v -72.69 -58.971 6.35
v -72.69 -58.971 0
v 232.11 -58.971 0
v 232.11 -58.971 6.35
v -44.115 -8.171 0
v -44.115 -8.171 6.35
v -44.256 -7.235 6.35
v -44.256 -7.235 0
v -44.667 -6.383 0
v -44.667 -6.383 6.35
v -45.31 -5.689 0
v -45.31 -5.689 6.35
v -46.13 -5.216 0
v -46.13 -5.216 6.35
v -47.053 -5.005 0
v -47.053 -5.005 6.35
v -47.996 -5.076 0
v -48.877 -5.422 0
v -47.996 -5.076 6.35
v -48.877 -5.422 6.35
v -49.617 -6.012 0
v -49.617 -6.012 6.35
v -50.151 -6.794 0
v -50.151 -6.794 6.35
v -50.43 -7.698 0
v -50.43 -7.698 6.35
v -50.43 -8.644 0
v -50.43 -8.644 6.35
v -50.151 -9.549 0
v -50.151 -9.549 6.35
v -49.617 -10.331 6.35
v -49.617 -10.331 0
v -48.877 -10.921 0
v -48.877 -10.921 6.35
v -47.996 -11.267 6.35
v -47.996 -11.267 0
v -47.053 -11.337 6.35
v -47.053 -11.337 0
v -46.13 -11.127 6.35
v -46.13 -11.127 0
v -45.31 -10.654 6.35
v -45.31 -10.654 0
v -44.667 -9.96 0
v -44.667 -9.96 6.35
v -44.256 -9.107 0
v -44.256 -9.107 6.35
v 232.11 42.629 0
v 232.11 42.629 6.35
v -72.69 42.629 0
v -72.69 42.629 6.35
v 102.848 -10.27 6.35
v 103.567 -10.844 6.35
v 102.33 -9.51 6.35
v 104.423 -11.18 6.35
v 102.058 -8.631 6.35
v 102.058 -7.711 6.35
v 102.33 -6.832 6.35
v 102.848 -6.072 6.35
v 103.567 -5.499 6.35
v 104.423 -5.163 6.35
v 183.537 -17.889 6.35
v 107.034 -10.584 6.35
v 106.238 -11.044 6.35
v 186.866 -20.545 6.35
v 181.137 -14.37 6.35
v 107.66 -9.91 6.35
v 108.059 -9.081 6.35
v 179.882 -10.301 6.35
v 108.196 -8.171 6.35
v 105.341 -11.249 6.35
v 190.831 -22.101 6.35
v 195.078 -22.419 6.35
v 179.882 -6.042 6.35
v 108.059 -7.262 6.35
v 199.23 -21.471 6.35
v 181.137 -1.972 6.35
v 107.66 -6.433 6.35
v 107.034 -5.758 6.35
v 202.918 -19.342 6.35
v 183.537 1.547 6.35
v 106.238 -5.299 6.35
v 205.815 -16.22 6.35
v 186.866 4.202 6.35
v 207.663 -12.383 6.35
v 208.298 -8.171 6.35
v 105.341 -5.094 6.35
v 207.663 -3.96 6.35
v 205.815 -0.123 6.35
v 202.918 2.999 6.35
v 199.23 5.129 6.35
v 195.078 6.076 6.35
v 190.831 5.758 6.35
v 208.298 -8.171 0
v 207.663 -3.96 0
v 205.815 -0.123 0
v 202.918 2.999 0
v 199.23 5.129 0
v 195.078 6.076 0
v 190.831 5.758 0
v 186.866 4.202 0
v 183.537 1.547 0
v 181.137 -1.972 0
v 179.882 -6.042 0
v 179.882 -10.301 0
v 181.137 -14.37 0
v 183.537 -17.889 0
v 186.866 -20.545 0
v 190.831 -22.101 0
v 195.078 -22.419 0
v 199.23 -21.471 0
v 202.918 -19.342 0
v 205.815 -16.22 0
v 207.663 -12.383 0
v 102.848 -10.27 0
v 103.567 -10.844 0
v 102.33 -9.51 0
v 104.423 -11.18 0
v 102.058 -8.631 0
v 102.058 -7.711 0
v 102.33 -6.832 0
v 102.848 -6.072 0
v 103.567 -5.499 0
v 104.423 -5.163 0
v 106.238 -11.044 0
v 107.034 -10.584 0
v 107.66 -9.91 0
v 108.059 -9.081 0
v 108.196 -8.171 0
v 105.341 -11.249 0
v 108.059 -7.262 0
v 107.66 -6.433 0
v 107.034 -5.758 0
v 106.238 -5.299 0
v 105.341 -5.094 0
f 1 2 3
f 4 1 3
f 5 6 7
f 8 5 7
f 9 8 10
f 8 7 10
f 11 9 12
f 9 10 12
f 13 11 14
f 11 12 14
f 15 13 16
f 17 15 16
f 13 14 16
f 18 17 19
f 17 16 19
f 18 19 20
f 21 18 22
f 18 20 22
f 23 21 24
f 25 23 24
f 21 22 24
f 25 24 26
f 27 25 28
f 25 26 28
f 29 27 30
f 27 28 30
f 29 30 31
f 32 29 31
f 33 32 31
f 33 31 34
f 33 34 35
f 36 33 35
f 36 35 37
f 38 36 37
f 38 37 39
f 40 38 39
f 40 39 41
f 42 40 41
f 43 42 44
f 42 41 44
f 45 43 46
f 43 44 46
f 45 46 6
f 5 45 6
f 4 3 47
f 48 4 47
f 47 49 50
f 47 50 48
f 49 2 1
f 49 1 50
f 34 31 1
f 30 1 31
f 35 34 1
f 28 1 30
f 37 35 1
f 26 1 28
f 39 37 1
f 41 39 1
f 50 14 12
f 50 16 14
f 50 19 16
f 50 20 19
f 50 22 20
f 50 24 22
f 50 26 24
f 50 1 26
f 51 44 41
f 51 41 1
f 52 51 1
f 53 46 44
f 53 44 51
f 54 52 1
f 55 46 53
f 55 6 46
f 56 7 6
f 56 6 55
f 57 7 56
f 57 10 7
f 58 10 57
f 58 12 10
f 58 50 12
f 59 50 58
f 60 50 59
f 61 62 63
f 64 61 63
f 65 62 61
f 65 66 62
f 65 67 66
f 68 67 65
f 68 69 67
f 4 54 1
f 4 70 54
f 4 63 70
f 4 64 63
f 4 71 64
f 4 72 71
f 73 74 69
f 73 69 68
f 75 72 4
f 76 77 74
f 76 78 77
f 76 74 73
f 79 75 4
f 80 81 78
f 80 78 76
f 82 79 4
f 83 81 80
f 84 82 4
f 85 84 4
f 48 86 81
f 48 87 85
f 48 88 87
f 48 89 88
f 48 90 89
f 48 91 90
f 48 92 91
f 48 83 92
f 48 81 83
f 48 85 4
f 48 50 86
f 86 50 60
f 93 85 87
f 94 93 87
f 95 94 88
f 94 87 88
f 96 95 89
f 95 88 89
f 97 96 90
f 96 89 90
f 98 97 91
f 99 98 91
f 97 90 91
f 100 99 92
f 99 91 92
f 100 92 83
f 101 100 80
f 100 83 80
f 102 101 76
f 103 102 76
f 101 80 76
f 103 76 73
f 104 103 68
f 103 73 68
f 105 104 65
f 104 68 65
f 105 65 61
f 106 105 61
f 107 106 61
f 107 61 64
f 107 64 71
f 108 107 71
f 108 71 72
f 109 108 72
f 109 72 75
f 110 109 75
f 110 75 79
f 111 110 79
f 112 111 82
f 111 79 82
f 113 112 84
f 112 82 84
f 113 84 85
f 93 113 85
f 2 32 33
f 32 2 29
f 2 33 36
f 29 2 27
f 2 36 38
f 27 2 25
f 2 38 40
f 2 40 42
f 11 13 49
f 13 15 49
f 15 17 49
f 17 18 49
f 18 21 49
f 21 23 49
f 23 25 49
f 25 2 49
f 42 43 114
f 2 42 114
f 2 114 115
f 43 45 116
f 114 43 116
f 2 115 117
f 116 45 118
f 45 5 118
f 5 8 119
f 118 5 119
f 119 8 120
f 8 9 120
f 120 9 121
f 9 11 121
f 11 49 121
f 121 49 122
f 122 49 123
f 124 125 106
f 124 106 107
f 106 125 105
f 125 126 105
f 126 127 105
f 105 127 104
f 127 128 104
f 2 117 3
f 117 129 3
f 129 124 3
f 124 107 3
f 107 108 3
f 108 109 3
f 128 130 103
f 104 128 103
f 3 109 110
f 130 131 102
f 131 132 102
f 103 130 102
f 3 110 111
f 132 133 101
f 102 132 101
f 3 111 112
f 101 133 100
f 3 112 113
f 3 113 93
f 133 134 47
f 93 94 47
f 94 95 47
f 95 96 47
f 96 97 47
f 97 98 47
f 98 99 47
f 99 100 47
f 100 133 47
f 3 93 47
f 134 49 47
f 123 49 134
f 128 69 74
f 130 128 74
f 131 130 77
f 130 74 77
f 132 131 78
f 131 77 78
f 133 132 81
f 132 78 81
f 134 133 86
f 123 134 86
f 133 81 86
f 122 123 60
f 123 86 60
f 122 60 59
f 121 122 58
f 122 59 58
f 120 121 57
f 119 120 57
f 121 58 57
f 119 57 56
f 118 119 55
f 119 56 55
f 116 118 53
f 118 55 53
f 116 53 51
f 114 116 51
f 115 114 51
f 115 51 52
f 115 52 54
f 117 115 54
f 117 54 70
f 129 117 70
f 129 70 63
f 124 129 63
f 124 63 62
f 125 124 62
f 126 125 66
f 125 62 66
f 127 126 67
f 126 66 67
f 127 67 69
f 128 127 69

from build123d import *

# Parameters (mm, degrees)
F0_W     = 304.8
F0_H     = 101.6
F1_DEPTH = 6.35
F2_R     = 3.175
F3_DEPTH = 6.35
F4_R     = 14.2875
F5_DEPTH = 6.35
F6_R     = 3.0861
F7_DEPTH = 6.35


with BuildPart() as f1:
    # F0 (on Top) → F1 (new body)
    with BuildSketch(Plane.XY):
        with Locations((79.710026, -8.171286)):
            Rectangle(F0_W, F0_H)
    extrude(amount=F1_DEPTH)

    # F2 (on face) → F3 (cut)
    with BuildSketch(Plane.XY.offset(6.35)):
        with Locations((-47.289974, -8.171286)):
            Circle(F2_R)
    extrude(amount=-F3_DEPTH, mode=Mode.SUBTRACT)

    # F4 (on face) → F5 (cut)
    with BuildSketch(Plane.XY.offset(6.35)):
        with Locations((194.010026, -8.171286)):
            Circle(F4_R)
    extrude(amount=-F5_DEPTH, mode=Mode.SUBTRACT)

    # F6 (on face) → F7 (cut)
    with BuildSketch(Plane.XY.offset(6.35)):
        with Locations((105.110026, -8.171286)):
            Circle(F6_R)
    extrude(amount=-F7_DEPTH, mode=Mode.SUBTRACT)


solid = f1.part
